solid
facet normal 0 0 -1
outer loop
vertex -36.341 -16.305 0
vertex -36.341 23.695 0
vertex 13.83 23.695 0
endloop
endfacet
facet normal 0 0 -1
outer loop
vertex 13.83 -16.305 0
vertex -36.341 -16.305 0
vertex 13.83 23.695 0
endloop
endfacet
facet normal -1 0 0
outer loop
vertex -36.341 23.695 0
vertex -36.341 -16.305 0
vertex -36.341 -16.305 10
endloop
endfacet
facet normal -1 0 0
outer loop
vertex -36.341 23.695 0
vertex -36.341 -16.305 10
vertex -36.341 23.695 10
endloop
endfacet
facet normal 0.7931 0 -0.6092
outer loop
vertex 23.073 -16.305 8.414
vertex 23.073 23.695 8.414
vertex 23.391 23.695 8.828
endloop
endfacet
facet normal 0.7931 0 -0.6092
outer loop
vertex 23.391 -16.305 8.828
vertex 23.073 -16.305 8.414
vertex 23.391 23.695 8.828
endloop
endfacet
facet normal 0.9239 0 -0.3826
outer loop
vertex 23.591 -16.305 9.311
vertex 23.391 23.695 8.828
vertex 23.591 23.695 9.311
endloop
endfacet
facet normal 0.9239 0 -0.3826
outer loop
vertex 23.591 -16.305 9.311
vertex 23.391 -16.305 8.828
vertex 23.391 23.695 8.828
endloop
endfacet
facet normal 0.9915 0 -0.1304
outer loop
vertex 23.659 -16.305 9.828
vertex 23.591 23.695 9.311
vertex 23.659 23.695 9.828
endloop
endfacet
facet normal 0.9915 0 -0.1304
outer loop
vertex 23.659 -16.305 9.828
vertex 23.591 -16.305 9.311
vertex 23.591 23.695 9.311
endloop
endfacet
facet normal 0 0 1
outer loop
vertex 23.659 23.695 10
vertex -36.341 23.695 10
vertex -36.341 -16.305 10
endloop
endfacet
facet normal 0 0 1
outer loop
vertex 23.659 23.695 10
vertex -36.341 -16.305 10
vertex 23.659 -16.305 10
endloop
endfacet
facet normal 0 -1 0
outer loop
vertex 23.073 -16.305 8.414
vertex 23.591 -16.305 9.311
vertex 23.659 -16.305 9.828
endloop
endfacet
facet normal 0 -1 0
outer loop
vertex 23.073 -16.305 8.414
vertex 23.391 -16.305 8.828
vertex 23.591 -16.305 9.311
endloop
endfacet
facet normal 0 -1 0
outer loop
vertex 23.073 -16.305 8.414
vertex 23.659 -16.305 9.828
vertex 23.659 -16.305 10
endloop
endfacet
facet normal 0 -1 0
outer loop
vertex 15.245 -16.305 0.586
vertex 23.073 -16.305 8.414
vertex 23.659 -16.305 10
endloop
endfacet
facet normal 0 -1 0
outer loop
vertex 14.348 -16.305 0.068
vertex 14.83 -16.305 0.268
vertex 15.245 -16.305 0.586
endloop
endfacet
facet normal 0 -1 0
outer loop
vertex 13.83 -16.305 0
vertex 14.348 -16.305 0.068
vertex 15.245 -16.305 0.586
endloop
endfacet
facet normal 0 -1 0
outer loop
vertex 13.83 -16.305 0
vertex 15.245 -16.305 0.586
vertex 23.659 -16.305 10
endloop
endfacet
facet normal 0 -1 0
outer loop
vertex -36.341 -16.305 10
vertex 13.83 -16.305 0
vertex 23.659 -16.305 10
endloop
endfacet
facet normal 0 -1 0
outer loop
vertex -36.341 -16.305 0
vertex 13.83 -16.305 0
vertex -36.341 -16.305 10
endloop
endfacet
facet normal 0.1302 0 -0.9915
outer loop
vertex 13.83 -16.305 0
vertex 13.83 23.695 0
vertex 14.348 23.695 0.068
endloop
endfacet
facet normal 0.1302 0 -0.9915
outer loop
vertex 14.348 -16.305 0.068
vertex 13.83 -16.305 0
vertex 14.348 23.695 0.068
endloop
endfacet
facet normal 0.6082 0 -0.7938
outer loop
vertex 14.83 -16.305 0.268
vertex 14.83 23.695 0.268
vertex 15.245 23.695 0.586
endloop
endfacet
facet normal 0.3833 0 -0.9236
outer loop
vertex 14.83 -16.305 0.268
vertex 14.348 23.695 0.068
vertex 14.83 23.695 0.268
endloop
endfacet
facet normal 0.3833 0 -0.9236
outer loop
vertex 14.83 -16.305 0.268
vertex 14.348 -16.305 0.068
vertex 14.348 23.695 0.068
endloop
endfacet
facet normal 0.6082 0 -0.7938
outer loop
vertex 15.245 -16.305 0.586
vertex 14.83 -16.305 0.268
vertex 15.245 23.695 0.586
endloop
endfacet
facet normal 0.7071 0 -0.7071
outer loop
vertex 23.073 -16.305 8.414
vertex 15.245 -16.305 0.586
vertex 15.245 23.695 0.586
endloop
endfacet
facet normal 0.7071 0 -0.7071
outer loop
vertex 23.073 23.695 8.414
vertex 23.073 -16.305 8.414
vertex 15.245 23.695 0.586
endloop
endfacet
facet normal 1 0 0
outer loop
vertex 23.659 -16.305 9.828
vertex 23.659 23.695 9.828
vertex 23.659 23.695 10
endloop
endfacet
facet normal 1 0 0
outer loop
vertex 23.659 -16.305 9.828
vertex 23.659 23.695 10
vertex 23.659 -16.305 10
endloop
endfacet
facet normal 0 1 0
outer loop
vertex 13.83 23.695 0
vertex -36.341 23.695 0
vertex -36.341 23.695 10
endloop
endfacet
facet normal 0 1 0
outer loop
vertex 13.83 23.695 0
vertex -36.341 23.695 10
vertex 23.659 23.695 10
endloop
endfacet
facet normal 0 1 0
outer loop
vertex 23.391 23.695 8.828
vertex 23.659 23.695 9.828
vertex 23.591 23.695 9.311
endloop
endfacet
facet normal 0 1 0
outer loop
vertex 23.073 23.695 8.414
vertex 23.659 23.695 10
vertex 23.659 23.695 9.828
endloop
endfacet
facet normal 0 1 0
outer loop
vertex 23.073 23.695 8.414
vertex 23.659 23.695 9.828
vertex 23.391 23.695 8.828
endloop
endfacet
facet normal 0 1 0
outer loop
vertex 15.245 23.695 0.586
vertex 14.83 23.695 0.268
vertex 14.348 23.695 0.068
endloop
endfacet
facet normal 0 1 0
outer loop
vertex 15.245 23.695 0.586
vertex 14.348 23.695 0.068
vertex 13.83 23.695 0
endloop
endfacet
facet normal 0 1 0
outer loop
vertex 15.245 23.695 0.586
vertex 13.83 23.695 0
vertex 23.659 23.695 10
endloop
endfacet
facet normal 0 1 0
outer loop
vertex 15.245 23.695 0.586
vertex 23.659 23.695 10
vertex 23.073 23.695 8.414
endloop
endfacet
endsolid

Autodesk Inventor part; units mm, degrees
ref_plane "YZ Plane" through (0, 0, 0) normal (1, 0, 0) x (0, 1, 0)
ref_plane "XZ Plane" through (0, 0, 0) normal (0, 1, 0) x (-1, 0, 0)
ref_plane "XY Plane" through (0, 0, 0) normal (0, 0, 1) x (1, 0, 0)
sketch "Skizze1" plane through (0, 0, 0) normal (0, 0, 1) x (1, 0, 0)
  line L0 (-36.3412, 23.6948) -> (23.6588, 23.6948)
  line L1 (23.6588, 23.6948) -> (23.6588, -16.3052)
  line L2 (23.6588, -16.3052) -> (-36.3412, -16.3052)
  line L3 (-36.3412, -16.3052) -> (-36.3412, 23.6948)
  point P0 (0, 0)
  dimension "d0" = 60
  dimension "d1" = 40
extrude "Extrusion1" add sketch "Skizze1" along normal blind 10
chamfer "Fase1" distance 9 angle 45 1 edges at (23.6588, 3.6948, 0)
fillet "Rundung1" radius 2 2 edges at (23.6588, 3.6948, 9) (14.6588, 3.6948, 0)
properties part number "KabelBoxDeckel"
